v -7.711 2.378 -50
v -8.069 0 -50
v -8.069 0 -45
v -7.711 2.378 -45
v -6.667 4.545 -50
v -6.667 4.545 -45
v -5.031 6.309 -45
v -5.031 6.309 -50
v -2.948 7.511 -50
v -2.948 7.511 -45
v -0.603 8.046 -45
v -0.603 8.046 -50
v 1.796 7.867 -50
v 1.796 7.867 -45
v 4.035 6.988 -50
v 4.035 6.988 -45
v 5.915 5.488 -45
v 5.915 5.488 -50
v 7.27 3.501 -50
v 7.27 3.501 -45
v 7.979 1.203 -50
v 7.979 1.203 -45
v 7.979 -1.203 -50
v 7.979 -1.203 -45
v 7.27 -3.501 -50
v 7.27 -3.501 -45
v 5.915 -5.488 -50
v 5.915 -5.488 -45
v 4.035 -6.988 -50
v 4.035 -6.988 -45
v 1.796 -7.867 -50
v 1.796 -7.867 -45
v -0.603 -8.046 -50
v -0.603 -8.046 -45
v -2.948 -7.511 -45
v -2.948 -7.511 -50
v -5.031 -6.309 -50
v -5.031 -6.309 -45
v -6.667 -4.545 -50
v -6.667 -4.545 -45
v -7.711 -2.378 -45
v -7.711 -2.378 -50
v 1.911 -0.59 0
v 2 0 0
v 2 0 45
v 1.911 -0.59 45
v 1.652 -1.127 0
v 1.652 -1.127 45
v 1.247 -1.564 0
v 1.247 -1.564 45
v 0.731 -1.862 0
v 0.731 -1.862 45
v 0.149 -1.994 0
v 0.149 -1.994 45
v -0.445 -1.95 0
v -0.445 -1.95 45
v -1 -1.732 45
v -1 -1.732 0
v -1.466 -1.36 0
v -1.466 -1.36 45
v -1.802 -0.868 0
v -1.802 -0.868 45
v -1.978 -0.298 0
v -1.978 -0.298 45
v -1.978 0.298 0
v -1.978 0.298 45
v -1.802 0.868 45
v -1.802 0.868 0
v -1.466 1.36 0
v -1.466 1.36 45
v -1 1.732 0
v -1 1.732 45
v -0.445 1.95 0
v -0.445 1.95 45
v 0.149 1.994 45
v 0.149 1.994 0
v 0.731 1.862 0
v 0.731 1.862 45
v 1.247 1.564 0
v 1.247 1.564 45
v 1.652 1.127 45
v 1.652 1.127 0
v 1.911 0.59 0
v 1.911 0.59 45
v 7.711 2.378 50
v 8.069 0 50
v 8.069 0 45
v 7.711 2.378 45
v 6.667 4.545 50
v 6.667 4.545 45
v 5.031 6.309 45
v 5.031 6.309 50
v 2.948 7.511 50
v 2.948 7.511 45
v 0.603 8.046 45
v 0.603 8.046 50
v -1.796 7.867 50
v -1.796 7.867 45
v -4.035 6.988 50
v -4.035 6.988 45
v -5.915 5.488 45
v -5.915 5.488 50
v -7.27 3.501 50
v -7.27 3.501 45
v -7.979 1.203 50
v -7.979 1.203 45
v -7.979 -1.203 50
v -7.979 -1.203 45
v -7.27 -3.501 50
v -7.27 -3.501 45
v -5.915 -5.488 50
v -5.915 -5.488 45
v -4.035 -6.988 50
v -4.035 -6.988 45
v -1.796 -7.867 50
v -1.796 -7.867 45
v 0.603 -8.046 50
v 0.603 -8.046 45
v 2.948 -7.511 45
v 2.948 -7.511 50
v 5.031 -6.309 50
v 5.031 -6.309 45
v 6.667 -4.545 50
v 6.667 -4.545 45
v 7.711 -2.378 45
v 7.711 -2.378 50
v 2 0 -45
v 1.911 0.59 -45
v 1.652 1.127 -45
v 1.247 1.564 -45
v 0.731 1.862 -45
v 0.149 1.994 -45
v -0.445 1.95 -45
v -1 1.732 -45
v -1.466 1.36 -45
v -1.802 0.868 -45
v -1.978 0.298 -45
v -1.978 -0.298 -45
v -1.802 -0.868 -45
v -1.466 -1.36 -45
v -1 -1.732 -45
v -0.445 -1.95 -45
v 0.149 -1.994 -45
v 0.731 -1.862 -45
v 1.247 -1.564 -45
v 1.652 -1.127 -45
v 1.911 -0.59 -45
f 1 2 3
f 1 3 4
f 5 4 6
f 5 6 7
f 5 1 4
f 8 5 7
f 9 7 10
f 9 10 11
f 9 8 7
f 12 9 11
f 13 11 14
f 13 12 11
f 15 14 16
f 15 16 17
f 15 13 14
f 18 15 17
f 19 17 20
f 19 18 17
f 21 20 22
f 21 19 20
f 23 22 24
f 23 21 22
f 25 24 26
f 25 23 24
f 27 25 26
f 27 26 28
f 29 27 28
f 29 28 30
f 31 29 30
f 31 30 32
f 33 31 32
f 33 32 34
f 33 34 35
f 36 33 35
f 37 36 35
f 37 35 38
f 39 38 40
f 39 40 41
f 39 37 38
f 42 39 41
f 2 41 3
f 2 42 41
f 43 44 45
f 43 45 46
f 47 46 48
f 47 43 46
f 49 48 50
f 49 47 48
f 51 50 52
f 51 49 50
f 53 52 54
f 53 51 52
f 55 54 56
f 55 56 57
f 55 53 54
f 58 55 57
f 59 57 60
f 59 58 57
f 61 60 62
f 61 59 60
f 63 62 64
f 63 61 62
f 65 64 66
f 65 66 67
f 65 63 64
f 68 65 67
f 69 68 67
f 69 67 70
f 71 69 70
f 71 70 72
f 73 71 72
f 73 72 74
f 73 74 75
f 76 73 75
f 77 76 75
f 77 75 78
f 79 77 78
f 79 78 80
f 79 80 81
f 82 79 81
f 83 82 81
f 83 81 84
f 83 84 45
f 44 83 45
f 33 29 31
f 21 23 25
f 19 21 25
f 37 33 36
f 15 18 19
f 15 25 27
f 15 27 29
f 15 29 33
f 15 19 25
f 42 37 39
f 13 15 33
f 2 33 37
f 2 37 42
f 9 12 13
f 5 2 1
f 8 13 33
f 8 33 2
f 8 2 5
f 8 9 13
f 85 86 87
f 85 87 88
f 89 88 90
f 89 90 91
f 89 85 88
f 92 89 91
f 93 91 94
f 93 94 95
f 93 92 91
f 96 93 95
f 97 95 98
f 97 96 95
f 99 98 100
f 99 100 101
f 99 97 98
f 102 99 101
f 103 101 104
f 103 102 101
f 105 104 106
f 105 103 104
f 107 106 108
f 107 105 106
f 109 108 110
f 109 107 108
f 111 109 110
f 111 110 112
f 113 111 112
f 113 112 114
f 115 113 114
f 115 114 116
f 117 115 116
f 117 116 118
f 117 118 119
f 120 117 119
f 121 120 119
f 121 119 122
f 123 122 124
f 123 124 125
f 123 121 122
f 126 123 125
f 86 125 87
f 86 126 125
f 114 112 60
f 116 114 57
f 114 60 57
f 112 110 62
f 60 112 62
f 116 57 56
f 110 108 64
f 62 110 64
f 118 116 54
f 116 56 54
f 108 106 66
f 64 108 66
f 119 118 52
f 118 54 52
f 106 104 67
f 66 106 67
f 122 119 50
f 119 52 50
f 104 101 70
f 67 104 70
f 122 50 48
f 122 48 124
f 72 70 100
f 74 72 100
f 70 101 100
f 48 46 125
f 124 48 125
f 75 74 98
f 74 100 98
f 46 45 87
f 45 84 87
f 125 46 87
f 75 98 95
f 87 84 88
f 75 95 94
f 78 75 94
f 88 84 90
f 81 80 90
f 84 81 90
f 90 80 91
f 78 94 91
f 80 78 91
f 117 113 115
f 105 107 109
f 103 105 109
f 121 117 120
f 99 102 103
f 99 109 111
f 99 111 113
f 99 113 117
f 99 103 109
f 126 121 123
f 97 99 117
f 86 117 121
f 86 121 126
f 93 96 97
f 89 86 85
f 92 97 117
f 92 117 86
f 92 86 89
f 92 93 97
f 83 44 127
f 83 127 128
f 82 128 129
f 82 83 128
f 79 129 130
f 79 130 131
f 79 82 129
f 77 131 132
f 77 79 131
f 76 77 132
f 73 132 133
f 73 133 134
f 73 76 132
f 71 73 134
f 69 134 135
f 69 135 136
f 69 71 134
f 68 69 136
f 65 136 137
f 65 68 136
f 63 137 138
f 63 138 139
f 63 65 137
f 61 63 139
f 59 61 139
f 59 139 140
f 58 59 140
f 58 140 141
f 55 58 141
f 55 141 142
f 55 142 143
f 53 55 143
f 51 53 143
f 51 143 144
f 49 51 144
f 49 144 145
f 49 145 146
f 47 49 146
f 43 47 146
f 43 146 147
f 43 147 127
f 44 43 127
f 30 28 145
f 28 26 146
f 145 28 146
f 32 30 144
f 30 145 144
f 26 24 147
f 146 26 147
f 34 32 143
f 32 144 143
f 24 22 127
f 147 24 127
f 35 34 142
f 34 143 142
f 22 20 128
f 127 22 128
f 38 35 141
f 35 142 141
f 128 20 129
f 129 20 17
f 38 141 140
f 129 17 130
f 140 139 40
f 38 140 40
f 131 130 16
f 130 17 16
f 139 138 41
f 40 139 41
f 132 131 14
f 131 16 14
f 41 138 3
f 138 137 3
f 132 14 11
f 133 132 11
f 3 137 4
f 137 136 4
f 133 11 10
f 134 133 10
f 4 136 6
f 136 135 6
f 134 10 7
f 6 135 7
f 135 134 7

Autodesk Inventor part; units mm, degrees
ref_plane "YZ Plane" through (0, 0, 0) normal (1, 0, 0) x (0, 1, 0)
ref_plane "XZ Plane" through (0, 0, 0) normal (0, 1, 0) x (-1, 0, 0)
ref_plane "XY Plane" through (0, 0, 0) normal (0, 0, 1) x (1, 0, 0)
sketch "Sketch1" plane through (0, 0, 0) normal (0, 0, 1) x (1, 0, 0)
  circle A0 centre (0, 0) radius 2
  dimension "d0" = 4
extrude "Extrusion1" add sketch "Sketch1" along normal mid plane 100
sketch "Sketch2" plane through (0, 0, 50) normal (0, 0, 1) x (1, 0, 0)
  circle A0 centre (0, 0) radius 8.069
extrude "Extrusion2" add sketch "Sketch2" against normal blind 5
sketch "Sketch3" plane through (0, 0, -50) normal (0, 0, -1) x (-1, 0, 0)
  circle A0 centre (0, 0) radius 8.069
extrude "Extrusion3" add sketch "Sketch3" against normal blind 5
properties part number "weights"
